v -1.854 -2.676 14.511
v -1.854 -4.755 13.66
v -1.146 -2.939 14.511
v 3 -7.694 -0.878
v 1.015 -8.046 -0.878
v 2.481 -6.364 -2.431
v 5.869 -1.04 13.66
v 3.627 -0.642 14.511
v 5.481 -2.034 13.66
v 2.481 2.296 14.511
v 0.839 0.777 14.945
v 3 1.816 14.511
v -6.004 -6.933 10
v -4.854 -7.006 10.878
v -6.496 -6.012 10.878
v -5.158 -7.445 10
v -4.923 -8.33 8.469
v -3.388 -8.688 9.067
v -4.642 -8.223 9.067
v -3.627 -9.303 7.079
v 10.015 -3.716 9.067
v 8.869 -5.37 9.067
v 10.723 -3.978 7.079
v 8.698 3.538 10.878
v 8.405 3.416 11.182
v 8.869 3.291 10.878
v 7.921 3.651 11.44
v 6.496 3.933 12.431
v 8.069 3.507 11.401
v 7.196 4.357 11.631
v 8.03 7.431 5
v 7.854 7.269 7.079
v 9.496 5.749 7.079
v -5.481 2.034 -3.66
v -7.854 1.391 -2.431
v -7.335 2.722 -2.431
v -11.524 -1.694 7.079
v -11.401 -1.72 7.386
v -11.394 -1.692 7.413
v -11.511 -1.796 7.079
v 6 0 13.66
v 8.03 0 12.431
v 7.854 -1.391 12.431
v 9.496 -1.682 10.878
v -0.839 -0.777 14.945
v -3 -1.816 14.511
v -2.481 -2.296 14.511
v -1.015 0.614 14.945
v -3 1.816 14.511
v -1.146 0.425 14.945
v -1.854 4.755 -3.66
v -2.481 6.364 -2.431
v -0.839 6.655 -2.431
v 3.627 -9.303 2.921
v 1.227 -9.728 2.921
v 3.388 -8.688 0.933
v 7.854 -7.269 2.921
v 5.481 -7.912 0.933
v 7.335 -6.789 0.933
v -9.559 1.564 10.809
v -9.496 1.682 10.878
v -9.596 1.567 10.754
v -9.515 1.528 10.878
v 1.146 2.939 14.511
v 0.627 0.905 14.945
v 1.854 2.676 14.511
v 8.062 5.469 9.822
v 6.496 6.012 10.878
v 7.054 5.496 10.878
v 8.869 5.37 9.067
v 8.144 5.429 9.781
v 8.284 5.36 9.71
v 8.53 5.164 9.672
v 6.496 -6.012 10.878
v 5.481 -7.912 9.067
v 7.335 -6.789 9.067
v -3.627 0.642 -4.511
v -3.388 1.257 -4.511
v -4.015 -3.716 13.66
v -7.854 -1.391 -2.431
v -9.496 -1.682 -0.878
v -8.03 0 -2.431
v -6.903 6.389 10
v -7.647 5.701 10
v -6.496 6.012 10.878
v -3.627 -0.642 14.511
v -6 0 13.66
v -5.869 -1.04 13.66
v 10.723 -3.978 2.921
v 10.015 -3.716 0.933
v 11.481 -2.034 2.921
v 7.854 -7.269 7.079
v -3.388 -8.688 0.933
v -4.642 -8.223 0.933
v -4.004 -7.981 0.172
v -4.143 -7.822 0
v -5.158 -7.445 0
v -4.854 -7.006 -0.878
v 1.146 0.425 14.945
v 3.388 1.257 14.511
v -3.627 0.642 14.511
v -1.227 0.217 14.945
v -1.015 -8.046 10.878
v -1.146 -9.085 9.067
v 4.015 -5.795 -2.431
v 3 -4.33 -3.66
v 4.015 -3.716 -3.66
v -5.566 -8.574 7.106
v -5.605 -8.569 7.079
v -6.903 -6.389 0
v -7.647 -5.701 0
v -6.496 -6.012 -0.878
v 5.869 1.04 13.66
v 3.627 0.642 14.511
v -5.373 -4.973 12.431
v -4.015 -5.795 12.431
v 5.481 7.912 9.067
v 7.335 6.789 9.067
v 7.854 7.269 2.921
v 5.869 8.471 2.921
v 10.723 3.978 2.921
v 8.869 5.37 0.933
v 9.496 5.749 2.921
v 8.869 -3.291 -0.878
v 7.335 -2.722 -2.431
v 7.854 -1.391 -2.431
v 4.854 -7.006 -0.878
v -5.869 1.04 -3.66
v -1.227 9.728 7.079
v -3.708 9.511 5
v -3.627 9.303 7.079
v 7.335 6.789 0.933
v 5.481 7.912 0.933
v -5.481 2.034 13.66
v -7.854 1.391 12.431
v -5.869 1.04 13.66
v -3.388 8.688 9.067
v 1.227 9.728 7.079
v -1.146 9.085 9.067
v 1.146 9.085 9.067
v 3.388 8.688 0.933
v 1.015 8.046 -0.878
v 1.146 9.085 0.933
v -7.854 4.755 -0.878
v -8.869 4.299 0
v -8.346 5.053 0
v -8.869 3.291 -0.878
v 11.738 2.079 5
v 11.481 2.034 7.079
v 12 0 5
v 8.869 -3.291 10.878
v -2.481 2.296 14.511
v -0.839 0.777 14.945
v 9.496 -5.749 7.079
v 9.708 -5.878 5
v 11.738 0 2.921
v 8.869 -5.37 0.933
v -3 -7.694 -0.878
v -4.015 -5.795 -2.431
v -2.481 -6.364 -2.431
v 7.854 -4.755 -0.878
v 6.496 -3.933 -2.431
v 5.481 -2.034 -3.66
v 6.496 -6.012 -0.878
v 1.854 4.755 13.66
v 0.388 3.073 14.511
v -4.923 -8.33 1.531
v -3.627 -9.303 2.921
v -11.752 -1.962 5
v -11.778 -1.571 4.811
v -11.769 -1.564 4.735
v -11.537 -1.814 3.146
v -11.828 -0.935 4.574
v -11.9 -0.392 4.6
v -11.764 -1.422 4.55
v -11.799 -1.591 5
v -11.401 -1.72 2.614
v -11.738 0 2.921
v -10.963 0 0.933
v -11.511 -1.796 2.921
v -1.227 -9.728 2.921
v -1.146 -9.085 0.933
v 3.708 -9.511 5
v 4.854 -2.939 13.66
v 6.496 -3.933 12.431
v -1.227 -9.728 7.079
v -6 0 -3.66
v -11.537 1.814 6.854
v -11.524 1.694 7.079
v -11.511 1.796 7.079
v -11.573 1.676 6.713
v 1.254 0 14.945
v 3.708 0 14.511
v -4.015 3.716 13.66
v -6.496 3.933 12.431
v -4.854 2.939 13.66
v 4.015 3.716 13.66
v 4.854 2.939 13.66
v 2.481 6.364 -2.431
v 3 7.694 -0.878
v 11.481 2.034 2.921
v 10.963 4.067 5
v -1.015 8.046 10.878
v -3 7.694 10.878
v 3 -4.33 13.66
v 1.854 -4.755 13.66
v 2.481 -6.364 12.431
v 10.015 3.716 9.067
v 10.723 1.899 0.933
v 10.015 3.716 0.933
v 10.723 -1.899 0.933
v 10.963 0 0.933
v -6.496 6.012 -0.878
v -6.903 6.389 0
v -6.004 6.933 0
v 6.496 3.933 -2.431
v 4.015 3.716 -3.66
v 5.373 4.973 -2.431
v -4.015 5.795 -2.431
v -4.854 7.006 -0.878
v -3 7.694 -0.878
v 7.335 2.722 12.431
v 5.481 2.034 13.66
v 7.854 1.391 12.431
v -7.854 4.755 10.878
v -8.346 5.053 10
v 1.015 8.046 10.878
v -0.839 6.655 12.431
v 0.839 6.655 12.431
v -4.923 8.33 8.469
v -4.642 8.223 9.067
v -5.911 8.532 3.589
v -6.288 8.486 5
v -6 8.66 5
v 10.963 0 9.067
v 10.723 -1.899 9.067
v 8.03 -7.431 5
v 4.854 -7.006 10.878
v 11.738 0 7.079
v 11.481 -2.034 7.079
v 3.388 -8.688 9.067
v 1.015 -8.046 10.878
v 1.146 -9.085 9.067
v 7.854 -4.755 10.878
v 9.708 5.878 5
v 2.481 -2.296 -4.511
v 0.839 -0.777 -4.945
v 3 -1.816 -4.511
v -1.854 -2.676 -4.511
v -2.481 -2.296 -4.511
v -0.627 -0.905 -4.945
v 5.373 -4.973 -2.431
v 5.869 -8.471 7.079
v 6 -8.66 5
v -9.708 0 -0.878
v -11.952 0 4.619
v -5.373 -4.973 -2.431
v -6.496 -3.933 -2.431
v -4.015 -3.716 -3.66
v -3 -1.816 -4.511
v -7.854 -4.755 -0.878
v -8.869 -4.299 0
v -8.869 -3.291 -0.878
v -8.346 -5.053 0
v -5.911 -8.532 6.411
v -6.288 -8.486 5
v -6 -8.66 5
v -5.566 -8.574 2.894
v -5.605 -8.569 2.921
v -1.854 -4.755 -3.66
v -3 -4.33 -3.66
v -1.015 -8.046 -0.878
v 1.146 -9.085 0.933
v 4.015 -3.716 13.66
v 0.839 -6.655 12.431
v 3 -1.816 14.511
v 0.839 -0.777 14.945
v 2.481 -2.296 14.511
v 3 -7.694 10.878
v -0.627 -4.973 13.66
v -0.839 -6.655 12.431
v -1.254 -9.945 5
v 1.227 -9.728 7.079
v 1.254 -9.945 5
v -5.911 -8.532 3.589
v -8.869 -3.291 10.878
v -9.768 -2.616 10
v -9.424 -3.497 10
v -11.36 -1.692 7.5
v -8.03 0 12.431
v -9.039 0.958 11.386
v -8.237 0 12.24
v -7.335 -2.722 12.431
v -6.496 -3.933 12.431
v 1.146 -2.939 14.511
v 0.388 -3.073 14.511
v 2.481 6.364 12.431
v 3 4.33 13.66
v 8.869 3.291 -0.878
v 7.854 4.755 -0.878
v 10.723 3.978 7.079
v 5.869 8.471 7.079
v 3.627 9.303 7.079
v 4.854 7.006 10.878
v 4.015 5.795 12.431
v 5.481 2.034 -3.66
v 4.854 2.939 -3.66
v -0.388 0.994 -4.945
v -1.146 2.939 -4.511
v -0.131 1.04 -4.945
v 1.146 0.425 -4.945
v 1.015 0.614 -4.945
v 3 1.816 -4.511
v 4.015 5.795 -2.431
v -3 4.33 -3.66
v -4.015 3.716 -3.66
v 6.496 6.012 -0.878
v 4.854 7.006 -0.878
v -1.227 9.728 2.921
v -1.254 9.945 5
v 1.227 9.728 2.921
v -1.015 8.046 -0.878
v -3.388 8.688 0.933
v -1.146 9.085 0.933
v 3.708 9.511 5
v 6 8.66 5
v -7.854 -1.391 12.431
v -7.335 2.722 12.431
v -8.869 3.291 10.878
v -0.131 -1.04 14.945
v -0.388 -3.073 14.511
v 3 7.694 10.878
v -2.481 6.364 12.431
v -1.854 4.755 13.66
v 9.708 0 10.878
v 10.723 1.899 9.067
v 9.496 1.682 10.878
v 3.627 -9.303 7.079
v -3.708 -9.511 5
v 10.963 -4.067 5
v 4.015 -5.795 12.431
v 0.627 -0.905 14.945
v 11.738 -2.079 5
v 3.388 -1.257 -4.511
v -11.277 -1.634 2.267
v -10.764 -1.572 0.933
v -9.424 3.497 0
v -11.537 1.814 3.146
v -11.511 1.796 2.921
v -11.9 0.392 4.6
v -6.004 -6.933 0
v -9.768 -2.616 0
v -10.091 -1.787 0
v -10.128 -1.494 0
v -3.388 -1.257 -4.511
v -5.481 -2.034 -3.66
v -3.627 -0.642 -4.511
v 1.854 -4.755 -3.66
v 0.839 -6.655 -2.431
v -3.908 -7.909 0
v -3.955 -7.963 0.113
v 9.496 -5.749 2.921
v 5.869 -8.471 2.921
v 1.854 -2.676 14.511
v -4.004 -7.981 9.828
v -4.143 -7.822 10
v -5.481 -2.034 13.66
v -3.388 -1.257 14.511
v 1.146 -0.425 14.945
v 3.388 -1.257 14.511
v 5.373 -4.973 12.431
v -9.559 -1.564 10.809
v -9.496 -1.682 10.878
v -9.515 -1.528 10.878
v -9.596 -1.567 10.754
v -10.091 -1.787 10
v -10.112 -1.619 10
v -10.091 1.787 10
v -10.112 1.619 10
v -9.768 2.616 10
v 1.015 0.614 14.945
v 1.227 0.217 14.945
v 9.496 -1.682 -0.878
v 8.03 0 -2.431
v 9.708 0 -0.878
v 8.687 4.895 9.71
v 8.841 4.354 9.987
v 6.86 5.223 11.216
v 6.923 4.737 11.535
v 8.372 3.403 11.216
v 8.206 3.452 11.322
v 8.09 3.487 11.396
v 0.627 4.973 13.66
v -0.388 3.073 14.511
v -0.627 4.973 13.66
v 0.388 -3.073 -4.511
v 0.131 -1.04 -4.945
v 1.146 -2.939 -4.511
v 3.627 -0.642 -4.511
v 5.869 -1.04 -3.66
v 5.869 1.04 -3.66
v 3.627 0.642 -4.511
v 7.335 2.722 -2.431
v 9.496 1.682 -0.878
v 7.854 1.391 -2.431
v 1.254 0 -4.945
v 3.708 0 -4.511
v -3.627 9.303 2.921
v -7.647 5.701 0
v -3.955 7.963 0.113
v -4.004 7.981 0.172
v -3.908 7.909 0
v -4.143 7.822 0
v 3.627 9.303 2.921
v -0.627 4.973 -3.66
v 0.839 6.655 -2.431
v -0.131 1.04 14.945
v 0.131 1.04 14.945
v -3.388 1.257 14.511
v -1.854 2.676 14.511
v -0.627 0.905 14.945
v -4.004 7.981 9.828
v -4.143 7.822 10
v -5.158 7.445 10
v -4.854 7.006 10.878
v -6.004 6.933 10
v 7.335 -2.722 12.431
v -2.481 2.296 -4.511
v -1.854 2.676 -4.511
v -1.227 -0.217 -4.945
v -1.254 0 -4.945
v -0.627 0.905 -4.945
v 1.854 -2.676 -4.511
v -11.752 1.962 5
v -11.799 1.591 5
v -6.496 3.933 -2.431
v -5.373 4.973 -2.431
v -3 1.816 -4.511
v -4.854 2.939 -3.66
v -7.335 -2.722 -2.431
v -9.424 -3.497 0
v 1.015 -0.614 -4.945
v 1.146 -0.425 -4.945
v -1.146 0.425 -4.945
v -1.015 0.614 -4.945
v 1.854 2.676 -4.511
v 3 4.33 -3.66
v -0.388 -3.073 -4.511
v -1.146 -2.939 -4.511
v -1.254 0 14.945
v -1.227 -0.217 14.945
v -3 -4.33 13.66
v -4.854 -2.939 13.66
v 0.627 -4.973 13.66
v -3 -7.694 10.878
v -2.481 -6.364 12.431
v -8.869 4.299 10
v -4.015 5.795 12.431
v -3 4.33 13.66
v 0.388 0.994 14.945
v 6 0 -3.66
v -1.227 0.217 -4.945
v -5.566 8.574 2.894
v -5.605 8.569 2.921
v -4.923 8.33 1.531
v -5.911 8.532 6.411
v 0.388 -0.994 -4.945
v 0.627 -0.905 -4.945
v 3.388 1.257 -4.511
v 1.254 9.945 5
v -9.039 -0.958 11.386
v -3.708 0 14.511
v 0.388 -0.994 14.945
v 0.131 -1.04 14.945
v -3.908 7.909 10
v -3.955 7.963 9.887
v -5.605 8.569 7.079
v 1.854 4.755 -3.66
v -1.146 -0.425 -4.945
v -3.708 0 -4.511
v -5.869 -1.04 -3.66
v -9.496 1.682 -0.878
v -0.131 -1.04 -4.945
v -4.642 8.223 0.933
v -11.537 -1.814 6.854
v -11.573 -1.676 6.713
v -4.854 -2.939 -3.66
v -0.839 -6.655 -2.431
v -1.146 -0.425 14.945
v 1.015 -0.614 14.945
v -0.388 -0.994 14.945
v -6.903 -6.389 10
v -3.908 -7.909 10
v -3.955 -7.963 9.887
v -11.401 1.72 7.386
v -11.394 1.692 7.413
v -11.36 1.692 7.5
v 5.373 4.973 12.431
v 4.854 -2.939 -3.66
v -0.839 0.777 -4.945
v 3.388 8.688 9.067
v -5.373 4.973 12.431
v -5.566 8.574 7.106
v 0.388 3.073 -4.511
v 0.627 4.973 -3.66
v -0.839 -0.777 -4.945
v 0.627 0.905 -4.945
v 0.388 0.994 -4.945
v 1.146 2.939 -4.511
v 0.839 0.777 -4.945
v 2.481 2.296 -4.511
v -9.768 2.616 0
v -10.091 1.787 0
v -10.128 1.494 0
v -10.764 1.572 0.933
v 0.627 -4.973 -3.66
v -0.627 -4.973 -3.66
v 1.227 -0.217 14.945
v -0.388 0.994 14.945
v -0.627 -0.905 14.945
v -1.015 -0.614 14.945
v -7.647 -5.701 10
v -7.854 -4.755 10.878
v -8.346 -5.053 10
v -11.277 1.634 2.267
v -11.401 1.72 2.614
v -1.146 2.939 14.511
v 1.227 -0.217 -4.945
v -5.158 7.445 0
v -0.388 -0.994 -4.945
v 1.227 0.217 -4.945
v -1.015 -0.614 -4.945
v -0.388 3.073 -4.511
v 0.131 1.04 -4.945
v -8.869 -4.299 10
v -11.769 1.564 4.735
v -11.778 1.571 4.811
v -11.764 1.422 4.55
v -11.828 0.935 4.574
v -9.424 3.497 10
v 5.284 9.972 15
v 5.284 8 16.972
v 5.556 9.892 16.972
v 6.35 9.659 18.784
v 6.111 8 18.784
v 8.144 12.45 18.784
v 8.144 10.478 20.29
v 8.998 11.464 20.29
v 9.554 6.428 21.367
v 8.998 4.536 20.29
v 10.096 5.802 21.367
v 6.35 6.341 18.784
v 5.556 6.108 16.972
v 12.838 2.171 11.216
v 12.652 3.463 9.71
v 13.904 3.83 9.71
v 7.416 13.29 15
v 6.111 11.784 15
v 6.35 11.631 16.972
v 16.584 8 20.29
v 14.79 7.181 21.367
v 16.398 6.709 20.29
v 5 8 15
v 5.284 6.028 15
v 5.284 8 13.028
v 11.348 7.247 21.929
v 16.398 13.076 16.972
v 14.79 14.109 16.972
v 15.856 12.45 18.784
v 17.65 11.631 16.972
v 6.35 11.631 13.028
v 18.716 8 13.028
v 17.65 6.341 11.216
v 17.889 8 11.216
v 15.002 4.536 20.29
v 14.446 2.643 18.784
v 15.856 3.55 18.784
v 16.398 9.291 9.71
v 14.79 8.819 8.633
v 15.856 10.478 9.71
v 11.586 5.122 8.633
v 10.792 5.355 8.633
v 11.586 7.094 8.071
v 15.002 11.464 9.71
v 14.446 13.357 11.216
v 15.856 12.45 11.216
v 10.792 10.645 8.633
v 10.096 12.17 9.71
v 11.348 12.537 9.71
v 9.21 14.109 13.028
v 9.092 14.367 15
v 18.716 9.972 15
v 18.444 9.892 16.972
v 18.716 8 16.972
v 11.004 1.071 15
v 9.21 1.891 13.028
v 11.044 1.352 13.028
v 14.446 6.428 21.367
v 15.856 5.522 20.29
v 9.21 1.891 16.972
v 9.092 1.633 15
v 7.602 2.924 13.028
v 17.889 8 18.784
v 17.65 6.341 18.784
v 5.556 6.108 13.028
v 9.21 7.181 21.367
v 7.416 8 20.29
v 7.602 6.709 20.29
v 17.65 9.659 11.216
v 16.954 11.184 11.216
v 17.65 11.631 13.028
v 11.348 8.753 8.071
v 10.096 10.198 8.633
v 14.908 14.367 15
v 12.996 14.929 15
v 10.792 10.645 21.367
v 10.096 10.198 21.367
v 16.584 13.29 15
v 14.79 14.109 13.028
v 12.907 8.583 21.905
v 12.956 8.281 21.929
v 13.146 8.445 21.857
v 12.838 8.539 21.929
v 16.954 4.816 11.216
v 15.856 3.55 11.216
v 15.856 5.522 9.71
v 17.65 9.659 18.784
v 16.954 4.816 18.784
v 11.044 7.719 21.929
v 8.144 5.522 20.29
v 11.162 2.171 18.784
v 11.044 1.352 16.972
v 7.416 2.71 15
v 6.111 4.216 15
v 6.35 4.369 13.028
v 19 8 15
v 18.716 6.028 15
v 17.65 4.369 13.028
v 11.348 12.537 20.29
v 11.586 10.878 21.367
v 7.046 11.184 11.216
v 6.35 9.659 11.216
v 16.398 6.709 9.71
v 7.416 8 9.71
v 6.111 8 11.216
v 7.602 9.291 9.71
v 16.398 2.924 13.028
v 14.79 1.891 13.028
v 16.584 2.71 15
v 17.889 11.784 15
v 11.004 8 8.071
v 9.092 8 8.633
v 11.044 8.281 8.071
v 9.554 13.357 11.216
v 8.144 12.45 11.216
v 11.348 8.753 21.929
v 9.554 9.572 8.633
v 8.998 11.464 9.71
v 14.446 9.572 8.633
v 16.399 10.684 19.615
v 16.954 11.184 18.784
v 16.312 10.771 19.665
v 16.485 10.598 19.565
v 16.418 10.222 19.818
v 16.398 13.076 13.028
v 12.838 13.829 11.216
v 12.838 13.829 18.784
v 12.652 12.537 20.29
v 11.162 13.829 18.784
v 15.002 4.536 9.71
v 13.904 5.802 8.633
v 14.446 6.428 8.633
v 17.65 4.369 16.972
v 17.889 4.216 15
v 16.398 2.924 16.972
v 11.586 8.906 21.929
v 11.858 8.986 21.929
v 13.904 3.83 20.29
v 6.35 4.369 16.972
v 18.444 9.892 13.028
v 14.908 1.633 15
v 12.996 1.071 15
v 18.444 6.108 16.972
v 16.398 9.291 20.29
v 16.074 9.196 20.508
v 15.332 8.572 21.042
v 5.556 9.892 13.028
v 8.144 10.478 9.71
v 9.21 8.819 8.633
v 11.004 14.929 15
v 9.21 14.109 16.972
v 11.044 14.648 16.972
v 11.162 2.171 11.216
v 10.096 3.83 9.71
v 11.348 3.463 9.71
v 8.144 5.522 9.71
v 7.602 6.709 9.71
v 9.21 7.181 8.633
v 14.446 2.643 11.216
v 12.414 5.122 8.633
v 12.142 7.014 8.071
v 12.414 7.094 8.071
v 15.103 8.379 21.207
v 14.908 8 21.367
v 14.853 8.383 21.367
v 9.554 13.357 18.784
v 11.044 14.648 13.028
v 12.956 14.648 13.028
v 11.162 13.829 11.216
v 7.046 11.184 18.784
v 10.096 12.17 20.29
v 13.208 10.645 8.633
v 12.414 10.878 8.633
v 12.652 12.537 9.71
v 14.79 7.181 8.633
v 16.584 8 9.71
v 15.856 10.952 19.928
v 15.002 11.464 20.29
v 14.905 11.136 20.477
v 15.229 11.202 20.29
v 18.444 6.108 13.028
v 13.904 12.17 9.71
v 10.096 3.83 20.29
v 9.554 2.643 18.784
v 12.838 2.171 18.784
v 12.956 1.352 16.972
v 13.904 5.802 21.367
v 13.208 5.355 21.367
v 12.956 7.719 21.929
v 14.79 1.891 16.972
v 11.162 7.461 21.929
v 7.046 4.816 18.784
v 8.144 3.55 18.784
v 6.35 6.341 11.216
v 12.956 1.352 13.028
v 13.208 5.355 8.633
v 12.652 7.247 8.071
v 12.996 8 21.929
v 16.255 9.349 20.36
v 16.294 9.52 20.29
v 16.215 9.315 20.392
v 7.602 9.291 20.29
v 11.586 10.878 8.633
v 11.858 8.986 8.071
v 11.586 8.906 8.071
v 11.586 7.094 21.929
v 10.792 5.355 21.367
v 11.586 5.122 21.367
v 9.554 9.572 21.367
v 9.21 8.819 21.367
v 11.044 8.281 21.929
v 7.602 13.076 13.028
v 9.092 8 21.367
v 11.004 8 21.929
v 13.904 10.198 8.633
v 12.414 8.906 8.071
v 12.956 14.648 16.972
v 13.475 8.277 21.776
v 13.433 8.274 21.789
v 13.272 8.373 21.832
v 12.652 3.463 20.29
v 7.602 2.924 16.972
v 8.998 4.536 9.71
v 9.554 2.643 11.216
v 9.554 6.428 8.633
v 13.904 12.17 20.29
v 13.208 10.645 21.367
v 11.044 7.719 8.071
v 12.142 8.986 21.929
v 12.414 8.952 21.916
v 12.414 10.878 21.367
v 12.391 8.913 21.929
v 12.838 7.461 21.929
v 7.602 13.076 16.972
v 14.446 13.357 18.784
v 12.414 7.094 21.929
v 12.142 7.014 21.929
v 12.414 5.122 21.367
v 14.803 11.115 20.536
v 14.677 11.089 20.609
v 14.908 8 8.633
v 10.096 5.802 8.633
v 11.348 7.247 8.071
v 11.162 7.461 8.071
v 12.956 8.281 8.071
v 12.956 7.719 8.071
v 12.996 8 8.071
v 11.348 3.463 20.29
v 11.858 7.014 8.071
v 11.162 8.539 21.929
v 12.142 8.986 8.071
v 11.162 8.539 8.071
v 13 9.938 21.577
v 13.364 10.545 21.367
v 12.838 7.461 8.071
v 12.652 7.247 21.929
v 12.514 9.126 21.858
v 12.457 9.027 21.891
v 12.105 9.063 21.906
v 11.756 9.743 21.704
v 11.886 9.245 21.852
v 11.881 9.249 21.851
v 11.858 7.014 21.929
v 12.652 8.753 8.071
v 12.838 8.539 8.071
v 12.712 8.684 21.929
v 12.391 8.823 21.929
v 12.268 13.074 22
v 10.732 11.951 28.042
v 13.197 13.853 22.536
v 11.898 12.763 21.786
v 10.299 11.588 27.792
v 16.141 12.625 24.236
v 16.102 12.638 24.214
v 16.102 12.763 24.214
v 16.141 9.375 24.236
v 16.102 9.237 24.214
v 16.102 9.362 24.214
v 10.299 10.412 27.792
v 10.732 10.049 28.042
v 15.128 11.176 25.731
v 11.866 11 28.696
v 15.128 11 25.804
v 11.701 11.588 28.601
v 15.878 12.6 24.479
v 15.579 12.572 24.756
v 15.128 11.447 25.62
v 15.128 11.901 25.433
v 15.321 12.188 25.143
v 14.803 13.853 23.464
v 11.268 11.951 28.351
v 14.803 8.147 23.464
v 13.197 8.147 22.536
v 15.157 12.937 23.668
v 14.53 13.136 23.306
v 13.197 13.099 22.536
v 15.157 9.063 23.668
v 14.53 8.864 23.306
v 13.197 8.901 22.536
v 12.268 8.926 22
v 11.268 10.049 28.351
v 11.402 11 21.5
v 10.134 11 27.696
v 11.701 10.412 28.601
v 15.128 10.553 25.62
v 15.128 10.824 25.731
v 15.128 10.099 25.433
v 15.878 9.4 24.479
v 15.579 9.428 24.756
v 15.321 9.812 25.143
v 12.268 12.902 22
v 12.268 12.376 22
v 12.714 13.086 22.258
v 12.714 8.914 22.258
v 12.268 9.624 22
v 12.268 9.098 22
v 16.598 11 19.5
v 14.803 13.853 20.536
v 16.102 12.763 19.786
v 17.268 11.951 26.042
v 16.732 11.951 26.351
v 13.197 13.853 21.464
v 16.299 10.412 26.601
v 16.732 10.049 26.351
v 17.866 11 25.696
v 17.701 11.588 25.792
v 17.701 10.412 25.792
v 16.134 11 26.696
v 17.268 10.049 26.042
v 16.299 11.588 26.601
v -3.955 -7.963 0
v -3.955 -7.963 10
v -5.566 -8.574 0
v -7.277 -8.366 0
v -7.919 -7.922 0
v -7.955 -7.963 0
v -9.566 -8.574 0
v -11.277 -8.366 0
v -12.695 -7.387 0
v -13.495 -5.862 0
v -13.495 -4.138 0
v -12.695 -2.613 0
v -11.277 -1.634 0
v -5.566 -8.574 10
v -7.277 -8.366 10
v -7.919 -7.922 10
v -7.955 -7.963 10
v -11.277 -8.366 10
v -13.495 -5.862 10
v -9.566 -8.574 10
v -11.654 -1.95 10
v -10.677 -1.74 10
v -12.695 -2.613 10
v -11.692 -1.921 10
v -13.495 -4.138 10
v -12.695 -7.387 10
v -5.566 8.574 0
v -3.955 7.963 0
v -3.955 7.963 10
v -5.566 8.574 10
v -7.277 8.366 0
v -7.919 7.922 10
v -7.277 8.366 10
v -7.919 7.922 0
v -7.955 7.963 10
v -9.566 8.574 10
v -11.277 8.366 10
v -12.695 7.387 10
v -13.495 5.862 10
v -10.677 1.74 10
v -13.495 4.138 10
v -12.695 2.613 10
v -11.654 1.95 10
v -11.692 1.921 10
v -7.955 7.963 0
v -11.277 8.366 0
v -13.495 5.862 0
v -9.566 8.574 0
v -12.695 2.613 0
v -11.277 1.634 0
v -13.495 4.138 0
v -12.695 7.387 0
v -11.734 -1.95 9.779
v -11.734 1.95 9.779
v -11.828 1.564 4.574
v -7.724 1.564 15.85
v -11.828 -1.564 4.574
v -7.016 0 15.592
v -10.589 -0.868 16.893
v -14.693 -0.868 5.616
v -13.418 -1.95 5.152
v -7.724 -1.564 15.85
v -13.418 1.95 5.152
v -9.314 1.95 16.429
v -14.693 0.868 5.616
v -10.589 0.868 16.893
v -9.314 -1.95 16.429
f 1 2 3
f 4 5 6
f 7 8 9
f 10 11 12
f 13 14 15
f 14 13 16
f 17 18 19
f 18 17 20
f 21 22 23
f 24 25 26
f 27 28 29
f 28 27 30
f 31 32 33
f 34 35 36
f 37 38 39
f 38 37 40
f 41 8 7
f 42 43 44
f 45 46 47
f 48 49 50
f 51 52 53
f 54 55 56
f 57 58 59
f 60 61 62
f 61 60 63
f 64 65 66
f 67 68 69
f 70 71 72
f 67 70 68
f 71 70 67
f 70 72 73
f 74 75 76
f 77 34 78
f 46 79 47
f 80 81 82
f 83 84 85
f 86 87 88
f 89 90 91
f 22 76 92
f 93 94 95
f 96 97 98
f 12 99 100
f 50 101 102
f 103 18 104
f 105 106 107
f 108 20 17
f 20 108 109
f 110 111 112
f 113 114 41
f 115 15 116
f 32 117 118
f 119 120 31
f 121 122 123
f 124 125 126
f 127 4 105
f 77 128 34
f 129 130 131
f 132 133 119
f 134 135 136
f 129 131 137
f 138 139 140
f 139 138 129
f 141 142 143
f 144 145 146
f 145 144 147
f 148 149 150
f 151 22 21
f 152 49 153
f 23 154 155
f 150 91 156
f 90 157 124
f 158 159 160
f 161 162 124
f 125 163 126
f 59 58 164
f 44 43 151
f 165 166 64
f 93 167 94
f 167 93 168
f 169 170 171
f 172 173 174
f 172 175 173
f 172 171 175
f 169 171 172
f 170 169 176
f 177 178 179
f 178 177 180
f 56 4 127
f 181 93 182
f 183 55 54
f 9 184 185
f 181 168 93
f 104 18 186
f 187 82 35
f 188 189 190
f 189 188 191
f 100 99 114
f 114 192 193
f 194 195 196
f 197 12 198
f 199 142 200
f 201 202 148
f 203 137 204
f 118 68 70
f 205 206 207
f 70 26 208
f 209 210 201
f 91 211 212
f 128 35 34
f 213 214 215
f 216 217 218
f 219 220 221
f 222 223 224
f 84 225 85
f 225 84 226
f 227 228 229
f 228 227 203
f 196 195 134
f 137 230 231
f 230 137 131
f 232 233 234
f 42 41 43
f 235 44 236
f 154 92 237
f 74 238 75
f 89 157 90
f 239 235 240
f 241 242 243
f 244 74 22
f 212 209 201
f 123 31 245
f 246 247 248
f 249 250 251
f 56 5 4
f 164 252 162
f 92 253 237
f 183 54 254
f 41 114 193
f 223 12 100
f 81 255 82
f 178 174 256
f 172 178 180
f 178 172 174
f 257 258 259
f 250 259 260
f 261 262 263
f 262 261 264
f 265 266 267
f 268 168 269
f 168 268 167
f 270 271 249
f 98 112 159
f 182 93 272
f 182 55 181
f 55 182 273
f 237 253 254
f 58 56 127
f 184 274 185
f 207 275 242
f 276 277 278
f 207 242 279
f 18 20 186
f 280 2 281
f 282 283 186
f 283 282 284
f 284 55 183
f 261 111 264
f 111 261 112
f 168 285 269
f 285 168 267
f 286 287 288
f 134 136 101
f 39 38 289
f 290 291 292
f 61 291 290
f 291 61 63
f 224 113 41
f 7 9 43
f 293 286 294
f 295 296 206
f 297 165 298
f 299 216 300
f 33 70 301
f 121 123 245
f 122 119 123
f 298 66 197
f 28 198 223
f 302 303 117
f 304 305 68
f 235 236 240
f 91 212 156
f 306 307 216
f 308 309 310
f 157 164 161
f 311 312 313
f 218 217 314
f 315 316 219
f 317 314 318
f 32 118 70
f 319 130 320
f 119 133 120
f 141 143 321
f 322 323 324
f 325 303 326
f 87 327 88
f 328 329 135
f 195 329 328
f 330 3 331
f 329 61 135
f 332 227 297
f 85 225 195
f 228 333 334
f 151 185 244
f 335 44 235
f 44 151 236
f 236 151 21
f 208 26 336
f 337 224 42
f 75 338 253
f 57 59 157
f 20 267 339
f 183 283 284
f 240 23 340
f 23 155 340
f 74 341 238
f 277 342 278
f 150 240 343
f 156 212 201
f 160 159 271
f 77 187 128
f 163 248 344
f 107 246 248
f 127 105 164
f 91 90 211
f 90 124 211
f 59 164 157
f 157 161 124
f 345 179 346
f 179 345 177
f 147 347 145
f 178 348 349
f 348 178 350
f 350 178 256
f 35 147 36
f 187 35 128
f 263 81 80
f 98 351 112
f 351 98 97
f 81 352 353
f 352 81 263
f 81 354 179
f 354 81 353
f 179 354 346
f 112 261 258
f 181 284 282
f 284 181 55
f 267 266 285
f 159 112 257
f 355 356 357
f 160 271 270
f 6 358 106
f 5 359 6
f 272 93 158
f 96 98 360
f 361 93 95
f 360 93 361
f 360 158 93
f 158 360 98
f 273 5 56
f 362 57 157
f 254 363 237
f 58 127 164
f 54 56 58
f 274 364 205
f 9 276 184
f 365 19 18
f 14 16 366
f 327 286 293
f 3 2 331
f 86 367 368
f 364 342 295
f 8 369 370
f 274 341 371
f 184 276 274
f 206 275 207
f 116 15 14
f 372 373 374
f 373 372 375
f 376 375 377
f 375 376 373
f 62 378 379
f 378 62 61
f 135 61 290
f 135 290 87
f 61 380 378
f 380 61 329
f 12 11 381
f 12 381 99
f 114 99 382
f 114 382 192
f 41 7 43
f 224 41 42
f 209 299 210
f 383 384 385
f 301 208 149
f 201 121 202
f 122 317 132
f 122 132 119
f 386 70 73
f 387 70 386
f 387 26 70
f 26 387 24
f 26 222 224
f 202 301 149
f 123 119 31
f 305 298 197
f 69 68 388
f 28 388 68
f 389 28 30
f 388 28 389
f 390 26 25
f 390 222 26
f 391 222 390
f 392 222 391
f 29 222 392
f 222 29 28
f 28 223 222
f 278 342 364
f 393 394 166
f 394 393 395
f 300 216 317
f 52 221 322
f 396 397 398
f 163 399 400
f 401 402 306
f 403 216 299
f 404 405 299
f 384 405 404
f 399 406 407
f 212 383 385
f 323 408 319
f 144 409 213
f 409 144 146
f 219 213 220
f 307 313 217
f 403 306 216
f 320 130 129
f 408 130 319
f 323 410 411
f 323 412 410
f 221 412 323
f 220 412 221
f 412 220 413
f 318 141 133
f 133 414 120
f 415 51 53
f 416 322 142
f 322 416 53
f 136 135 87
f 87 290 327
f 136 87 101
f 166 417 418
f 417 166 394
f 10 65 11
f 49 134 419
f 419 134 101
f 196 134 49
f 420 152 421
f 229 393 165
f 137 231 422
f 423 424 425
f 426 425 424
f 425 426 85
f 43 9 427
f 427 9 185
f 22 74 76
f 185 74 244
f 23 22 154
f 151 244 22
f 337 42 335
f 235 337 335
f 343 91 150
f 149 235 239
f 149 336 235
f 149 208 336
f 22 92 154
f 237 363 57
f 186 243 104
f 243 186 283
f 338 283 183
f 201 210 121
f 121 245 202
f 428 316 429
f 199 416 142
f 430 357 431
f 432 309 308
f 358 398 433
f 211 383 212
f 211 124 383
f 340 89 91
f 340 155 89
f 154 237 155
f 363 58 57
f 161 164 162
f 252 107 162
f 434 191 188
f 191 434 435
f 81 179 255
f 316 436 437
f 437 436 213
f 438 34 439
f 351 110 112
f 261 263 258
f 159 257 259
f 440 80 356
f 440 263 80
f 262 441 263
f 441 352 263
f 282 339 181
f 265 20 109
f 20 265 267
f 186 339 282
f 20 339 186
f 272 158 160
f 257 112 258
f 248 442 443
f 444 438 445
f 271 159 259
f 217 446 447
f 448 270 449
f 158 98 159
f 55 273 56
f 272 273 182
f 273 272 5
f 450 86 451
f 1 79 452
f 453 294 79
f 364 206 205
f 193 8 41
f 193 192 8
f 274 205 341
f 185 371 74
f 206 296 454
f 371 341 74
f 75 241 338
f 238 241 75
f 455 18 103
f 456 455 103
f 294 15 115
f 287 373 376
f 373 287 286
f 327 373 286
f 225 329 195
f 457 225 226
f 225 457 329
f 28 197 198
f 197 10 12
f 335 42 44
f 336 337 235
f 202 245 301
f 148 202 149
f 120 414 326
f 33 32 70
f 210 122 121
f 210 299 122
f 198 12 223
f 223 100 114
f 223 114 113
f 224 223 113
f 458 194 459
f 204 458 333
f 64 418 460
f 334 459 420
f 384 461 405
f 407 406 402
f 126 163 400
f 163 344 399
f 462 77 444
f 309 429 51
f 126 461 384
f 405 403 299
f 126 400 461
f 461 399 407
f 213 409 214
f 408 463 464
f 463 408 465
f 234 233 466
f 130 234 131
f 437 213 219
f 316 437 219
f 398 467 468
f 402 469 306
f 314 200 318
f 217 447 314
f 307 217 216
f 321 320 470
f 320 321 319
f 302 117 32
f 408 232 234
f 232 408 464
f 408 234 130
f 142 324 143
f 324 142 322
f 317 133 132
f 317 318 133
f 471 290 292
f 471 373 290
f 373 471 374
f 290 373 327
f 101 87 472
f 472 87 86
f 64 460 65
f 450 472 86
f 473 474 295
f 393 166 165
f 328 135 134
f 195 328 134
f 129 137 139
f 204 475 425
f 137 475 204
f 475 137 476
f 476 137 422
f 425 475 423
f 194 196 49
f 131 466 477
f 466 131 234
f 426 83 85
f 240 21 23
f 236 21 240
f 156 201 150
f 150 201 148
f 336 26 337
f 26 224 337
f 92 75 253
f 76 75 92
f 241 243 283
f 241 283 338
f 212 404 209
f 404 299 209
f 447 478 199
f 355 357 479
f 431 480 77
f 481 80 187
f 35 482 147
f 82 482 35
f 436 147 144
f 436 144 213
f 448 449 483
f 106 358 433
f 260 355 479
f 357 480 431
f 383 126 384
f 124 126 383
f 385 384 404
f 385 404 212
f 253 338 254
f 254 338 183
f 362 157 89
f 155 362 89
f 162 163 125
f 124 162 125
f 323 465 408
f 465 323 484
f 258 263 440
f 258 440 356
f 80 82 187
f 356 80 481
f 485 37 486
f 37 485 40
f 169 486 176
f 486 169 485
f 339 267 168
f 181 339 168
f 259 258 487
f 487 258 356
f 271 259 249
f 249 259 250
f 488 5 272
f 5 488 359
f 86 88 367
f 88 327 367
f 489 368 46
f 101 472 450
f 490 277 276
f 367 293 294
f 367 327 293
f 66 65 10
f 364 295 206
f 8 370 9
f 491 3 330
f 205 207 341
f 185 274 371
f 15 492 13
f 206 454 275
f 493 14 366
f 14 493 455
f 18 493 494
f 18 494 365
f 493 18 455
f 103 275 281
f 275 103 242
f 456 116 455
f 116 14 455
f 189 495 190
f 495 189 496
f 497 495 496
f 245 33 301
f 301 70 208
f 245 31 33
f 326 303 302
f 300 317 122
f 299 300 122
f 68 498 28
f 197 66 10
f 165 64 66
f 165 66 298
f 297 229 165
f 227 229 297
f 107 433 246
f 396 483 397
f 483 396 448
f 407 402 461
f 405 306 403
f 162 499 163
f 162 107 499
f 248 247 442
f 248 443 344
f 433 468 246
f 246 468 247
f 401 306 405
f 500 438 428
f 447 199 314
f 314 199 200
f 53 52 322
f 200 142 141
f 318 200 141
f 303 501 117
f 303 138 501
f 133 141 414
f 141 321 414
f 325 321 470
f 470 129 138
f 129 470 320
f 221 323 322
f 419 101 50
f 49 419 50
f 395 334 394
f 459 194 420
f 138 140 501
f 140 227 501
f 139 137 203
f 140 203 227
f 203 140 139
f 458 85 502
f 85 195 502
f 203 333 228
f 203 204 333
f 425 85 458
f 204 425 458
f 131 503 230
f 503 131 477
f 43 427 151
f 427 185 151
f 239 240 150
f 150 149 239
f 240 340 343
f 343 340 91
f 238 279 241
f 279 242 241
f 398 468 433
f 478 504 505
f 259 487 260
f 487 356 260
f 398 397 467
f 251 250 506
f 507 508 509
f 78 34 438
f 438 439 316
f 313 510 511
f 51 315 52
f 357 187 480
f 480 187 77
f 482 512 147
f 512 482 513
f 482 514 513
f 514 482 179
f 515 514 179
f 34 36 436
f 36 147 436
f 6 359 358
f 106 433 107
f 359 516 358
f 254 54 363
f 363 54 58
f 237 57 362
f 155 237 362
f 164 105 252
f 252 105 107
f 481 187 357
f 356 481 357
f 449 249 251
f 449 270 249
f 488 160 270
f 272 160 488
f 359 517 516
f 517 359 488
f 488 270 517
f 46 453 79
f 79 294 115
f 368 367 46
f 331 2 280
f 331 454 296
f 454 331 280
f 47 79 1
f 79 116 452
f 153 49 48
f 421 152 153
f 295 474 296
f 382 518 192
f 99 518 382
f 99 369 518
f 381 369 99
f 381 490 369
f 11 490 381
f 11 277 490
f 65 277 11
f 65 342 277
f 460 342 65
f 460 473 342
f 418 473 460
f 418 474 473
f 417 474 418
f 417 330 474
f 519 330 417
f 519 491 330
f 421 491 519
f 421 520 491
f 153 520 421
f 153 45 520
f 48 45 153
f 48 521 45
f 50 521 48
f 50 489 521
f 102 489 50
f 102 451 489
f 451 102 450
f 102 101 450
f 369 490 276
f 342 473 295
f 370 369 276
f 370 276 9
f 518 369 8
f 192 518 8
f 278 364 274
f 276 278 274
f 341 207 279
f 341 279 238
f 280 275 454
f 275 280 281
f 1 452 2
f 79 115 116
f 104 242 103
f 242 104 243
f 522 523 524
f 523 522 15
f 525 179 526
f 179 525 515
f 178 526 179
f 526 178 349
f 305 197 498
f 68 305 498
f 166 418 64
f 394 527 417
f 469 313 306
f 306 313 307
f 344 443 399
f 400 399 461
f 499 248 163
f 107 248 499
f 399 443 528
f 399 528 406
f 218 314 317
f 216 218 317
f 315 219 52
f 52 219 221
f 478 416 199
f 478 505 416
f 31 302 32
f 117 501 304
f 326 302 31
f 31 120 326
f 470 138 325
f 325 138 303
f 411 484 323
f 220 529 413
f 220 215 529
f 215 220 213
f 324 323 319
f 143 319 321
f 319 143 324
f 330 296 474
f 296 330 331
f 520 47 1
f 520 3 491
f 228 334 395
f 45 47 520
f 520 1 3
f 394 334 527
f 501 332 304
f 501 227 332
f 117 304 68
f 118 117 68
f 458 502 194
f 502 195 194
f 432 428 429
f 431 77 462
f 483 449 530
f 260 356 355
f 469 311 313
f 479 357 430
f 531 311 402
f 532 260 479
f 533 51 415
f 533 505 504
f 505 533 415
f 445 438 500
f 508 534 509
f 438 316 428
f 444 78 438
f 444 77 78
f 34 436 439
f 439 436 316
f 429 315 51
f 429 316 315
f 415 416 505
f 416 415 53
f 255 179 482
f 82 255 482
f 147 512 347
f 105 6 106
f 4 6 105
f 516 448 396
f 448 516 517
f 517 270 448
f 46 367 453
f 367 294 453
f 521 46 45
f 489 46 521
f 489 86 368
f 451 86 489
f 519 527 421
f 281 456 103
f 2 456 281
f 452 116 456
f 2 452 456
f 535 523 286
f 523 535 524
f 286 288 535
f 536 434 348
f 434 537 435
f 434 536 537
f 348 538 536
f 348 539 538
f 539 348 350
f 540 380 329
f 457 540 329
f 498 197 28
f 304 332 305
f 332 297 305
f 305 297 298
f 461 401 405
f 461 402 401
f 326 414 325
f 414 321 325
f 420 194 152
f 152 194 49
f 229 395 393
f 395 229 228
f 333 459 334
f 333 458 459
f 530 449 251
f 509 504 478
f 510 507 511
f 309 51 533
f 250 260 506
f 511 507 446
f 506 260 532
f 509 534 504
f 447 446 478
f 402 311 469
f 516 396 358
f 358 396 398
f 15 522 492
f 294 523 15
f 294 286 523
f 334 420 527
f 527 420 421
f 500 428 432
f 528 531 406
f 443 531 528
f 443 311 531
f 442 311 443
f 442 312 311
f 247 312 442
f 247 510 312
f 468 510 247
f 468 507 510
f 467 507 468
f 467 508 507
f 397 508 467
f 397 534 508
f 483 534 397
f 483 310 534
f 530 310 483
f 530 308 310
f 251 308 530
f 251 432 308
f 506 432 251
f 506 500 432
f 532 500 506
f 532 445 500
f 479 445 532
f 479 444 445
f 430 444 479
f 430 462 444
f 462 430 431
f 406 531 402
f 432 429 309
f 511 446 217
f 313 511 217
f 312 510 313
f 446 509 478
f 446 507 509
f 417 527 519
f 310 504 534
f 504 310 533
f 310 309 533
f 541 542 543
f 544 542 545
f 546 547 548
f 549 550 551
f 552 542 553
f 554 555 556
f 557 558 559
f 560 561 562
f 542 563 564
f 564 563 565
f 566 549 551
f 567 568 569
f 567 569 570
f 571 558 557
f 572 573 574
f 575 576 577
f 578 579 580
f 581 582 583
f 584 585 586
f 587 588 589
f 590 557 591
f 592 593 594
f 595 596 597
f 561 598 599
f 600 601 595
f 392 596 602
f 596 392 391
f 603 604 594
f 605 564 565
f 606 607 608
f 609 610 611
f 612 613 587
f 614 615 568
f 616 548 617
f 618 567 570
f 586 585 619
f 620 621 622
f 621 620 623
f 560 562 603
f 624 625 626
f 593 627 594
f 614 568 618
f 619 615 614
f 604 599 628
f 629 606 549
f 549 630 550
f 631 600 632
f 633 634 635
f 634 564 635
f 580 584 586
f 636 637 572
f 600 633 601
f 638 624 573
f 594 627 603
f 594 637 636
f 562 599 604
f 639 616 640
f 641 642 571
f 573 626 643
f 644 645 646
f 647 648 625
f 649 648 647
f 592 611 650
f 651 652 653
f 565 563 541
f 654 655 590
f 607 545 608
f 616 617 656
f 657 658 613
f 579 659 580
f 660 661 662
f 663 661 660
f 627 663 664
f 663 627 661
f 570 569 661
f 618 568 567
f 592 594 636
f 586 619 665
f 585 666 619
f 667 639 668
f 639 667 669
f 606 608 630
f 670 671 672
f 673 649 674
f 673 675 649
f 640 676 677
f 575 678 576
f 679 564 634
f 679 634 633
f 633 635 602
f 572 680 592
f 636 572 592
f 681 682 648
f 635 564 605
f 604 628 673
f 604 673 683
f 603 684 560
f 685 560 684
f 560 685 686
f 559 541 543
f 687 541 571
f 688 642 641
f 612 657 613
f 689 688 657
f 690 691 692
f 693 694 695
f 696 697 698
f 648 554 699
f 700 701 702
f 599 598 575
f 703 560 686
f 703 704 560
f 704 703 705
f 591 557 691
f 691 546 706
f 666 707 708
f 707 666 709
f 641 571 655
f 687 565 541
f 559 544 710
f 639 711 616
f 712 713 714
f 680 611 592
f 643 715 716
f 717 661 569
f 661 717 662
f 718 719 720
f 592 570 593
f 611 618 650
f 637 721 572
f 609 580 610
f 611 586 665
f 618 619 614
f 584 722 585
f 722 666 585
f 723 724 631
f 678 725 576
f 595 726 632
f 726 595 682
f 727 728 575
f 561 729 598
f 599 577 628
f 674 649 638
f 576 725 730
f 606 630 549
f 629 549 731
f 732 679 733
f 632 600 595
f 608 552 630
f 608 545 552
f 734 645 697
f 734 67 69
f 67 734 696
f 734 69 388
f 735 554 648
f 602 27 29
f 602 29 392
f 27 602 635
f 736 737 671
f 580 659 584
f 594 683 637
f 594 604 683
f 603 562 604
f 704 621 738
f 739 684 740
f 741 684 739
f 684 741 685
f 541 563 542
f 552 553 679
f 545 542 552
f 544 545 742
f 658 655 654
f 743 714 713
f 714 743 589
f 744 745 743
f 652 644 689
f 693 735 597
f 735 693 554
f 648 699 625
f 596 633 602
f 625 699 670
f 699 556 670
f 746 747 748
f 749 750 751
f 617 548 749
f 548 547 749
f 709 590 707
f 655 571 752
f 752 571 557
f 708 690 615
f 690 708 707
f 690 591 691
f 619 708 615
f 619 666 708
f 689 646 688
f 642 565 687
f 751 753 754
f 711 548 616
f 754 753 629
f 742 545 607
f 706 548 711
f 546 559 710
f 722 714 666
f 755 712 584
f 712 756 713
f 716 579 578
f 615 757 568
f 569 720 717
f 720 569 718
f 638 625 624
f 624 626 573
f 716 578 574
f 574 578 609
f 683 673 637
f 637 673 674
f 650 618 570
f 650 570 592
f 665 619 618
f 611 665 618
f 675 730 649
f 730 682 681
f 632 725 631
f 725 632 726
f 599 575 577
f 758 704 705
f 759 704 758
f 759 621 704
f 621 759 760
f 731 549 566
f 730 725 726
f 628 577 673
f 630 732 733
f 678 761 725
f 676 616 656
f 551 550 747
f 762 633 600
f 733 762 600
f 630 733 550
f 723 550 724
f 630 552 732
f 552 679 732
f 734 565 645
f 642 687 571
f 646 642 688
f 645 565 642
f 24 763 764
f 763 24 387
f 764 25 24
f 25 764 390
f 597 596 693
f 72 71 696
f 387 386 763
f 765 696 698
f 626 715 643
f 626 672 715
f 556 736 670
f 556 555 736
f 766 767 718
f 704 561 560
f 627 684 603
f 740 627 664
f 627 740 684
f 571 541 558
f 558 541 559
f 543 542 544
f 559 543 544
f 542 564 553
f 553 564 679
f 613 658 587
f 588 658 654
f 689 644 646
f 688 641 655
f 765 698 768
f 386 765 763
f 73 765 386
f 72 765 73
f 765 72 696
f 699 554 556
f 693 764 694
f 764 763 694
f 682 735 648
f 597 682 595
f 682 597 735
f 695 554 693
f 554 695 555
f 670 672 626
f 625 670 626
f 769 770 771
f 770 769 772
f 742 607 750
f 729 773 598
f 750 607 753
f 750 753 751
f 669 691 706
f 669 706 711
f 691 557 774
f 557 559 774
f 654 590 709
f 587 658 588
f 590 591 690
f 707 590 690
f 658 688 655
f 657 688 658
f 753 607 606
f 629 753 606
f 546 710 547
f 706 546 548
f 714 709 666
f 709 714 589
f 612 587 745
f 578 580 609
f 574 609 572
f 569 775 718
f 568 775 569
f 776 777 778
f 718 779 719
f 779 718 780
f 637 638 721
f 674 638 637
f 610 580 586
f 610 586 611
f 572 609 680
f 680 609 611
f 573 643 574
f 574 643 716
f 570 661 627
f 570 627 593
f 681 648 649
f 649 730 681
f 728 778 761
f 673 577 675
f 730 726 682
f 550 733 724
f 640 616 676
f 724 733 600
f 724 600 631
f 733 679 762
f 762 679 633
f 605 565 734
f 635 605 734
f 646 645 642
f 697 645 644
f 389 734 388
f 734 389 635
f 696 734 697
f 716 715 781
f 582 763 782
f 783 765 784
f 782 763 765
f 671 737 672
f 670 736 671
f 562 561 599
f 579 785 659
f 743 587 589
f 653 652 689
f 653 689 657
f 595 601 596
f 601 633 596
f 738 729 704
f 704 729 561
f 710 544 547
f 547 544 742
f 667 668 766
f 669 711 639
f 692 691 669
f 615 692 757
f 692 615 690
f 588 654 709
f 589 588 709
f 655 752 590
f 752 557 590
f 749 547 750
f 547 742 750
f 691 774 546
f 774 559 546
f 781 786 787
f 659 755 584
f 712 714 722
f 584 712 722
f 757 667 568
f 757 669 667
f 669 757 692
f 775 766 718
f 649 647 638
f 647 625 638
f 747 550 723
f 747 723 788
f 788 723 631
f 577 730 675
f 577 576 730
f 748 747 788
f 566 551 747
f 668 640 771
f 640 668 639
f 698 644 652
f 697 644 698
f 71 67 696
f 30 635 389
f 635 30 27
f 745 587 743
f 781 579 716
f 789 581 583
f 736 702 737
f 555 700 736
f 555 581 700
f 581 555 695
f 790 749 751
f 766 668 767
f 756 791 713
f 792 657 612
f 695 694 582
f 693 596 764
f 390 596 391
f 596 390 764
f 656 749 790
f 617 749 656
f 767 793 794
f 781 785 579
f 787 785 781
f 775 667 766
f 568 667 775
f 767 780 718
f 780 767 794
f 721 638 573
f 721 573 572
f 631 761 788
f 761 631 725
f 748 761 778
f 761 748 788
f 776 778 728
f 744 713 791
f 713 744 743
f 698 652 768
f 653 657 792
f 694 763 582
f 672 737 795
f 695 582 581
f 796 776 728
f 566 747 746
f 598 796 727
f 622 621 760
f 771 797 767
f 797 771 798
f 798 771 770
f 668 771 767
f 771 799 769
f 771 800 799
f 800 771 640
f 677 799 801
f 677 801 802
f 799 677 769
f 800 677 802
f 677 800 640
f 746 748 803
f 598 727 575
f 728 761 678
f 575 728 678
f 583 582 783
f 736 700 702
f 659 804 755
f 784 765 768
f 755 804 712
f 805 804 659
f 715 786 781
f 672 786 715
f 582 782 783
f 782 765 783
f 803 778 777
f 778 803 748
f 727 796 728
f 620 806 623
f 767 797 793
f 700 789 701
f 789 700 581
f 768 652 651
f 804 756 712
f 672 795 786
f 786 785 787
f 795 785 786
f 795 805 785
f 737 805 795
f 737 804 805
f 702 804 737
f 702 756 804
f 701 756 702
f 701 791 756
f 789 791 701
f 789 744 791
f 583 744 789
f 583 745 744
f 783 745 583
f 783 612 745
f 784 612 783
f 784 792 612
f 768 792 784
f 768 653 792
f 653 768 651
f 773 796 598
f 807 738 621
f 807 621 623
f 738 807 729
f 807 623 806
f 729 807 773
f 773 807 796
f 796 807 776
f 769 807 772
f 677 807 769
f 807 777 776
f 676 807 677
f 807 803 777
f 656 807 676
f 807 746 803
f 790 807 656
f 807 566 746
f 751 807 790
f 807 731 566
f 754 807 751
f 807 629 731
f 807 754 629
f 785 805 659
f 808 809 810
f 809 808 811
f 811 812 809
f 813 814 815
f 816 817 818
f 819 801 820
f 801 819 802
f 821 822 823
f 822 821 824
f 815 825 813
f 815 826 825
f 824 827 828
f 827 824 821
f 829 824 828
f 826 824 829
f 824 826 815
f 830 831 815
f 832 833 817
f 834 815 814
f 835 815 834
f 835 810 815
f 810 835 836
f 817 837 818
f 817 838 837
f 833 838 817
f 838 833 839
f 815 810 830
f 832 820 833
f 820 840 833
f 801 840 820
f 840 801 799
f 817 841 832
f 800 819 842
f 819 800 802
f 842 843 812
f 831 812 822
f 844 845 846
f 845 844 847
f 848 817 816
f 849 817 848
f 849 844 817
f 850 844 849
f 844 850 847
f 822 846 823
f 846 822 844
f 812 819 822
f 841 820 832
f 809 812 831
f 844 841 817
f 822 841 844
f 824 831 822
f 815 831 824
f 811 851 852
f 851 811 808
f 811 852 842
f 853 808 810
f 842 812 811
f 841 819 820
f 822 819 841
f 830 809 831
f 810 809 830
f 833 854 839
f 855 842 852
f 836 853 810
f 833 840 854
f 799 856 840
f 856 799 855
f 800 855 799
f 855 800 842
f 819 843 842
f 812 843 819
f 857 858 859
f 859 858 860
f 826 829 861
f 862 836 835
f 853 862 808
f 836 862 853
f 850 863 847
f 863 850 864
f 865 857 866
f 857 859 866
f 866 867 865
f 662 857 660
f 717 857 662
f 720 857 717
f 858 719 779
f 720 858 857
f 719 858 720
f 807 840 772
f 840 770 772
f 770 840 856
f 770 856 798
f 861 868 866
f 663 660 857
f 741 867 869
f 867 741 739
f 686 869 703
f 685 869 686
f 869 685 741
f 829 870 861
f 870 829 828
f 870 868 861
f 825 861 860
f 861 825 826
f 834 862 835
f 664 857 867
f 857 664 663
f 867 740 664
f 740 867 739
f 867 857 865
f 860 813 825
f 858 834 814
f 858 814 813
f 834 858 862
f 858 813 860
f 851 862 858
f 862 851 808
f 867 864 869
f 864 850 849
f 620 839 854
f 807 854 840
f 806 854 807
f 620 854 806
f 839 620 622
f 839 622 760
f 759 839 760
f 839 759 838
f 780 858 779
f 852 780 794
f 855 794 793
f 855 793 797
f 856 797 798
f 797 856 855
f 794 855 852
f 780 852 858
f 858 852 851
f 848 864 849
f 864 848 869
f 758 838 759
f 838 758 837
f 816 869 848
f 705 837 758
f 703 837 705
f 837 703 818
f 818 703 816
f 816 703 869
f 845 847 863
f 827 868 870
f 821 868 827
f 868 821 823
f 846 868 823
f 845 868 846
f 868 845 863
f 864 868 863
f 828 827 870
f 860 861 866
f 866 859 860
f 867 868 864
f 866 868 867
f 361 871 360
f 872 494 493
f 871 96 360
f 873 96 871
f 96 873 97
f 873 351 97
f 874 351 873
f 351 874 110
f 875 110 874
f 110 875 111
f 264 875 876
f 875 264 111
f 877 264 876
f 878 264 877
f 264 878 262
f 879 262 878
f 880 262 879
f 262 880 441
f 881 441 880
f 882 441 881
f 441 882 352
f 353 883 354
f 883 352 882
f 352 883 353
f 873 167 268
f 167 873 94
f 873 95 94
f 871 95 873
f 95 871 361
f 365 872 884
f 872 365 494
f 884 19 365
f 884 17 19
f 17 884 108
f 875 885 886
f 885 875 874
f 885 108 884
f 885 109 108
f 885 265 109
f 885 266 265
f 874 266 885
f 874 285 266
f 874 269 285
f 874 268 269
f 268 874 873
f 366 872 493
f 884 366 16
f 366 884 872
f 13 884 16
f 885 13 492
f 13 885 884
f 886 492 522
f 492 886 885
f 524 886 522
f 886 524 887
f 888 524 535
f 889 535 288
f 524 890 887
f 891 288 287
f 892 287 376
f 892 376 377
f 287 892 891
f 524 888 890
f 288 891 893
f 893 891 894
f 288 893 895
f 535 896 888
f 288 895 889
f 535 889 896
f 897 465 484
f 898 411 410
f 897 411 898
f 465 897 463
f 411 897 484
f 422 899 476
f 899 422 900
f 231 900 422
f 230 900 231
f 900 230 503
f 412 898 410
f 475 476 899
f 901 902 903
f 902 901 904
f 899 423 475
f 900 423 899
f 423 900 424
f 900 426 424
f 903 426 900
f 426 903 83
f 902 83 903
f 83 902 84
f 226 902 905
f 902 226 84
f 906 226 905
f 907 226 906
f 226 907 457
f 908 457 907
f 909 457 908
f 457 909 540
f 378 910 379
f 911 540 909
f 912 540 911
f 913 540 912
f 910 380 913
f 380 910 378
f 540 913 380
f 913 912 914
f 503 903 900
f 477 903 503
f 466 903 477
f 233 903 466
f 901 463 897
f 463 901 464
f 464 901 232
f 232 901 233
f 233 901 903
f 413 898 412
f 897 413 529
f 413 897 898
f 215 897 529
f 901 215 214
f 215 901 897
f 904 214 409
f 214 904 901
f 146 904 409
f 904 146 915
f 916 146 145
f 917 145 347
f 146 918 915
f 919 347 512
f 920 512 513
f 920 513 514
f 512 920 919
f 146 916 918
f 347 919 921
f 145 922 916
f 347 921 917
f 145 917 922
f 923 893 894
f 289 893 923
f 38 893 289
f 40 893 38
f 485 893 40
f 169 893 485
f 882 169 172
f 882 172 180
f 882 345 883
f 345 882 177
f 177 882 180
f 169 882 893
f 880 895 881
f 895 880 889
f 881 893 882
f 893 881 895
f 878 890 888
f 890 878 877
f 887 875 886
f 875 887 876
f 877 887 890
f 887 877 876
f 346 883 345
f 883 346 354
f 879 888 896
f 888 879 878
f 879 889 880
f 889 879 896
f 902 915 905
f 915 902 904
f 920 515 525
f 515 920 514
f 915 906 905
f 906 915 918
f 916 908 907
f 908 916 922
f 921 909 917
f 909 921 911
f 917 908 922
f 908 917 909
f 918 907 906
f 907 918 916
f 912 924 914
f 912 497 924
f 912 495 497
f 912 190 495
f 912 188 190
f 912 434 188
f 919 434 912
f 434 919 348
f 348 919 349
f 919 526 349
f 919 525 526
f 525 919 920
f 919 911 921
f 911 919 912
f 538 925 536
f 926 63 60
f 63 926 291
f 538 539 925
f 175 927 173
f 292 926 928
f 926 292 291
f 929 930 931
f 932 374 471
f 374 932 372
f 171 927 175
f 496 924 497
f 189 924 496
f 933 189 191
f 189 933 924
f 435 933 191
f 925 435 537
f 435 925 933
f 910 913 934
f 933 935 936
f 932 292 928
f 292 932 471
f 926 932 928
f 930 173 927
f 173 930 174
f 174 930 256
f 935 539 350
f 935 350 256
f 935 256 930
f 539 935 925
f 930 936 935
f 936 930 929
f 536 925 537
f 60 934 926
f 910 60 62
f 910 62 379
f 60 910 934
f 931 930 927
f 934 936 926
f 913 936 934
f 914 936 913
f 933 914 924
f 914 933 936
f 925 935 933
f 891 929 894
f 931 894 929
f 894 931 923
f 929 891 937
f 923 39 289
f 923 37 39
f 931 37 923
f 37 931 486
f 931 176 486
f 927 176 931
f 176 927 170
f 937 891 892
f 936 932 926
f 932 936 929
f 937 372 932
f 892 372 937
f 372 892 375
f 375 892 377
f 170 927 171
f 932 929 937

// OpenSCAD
// Generated by CadMonkey
// Prompt: hey cadmonkey, create me a cat
// Generated at: 2025-11-11 05:47:46

// Simple stylized cat model
// Body
translate([0, 0, 5])
    scale([1.2, 1, 1])
        sphere(10);

// Head
translate([12, 8, 15])
    sphere(7);

// Ears
translate([14, 11, 23])
    rotate([0, -30, 0])
        cylinder(h=6, r1=3, r2=1);
translate([14, 11, 21])
    rotate([0, 30, 0])
        cylinder(h=6, r1=3, r2=1);

// Legs
translate([-6, -5, 0])
    scale([0.9, 0.9, 1])
        cylinder(h=10, r=4);
translate([-6, 5, 0])
    scale([0.9, 0.9, 1])
        cylinder(h=10, r=4);
translate([-10, -5, 0])
    scale([0.9, 0.9, 1])
        cylinder(h=10, r=4);
translate([-10, 5, 0])
    scale([0.9, 0.9, 1])
        cylinder(h=10, r=4);

// Tail
translate([-13, 0, 5])
    rotate([0, 20, 0])
        cylinder(h=12, r=2);
